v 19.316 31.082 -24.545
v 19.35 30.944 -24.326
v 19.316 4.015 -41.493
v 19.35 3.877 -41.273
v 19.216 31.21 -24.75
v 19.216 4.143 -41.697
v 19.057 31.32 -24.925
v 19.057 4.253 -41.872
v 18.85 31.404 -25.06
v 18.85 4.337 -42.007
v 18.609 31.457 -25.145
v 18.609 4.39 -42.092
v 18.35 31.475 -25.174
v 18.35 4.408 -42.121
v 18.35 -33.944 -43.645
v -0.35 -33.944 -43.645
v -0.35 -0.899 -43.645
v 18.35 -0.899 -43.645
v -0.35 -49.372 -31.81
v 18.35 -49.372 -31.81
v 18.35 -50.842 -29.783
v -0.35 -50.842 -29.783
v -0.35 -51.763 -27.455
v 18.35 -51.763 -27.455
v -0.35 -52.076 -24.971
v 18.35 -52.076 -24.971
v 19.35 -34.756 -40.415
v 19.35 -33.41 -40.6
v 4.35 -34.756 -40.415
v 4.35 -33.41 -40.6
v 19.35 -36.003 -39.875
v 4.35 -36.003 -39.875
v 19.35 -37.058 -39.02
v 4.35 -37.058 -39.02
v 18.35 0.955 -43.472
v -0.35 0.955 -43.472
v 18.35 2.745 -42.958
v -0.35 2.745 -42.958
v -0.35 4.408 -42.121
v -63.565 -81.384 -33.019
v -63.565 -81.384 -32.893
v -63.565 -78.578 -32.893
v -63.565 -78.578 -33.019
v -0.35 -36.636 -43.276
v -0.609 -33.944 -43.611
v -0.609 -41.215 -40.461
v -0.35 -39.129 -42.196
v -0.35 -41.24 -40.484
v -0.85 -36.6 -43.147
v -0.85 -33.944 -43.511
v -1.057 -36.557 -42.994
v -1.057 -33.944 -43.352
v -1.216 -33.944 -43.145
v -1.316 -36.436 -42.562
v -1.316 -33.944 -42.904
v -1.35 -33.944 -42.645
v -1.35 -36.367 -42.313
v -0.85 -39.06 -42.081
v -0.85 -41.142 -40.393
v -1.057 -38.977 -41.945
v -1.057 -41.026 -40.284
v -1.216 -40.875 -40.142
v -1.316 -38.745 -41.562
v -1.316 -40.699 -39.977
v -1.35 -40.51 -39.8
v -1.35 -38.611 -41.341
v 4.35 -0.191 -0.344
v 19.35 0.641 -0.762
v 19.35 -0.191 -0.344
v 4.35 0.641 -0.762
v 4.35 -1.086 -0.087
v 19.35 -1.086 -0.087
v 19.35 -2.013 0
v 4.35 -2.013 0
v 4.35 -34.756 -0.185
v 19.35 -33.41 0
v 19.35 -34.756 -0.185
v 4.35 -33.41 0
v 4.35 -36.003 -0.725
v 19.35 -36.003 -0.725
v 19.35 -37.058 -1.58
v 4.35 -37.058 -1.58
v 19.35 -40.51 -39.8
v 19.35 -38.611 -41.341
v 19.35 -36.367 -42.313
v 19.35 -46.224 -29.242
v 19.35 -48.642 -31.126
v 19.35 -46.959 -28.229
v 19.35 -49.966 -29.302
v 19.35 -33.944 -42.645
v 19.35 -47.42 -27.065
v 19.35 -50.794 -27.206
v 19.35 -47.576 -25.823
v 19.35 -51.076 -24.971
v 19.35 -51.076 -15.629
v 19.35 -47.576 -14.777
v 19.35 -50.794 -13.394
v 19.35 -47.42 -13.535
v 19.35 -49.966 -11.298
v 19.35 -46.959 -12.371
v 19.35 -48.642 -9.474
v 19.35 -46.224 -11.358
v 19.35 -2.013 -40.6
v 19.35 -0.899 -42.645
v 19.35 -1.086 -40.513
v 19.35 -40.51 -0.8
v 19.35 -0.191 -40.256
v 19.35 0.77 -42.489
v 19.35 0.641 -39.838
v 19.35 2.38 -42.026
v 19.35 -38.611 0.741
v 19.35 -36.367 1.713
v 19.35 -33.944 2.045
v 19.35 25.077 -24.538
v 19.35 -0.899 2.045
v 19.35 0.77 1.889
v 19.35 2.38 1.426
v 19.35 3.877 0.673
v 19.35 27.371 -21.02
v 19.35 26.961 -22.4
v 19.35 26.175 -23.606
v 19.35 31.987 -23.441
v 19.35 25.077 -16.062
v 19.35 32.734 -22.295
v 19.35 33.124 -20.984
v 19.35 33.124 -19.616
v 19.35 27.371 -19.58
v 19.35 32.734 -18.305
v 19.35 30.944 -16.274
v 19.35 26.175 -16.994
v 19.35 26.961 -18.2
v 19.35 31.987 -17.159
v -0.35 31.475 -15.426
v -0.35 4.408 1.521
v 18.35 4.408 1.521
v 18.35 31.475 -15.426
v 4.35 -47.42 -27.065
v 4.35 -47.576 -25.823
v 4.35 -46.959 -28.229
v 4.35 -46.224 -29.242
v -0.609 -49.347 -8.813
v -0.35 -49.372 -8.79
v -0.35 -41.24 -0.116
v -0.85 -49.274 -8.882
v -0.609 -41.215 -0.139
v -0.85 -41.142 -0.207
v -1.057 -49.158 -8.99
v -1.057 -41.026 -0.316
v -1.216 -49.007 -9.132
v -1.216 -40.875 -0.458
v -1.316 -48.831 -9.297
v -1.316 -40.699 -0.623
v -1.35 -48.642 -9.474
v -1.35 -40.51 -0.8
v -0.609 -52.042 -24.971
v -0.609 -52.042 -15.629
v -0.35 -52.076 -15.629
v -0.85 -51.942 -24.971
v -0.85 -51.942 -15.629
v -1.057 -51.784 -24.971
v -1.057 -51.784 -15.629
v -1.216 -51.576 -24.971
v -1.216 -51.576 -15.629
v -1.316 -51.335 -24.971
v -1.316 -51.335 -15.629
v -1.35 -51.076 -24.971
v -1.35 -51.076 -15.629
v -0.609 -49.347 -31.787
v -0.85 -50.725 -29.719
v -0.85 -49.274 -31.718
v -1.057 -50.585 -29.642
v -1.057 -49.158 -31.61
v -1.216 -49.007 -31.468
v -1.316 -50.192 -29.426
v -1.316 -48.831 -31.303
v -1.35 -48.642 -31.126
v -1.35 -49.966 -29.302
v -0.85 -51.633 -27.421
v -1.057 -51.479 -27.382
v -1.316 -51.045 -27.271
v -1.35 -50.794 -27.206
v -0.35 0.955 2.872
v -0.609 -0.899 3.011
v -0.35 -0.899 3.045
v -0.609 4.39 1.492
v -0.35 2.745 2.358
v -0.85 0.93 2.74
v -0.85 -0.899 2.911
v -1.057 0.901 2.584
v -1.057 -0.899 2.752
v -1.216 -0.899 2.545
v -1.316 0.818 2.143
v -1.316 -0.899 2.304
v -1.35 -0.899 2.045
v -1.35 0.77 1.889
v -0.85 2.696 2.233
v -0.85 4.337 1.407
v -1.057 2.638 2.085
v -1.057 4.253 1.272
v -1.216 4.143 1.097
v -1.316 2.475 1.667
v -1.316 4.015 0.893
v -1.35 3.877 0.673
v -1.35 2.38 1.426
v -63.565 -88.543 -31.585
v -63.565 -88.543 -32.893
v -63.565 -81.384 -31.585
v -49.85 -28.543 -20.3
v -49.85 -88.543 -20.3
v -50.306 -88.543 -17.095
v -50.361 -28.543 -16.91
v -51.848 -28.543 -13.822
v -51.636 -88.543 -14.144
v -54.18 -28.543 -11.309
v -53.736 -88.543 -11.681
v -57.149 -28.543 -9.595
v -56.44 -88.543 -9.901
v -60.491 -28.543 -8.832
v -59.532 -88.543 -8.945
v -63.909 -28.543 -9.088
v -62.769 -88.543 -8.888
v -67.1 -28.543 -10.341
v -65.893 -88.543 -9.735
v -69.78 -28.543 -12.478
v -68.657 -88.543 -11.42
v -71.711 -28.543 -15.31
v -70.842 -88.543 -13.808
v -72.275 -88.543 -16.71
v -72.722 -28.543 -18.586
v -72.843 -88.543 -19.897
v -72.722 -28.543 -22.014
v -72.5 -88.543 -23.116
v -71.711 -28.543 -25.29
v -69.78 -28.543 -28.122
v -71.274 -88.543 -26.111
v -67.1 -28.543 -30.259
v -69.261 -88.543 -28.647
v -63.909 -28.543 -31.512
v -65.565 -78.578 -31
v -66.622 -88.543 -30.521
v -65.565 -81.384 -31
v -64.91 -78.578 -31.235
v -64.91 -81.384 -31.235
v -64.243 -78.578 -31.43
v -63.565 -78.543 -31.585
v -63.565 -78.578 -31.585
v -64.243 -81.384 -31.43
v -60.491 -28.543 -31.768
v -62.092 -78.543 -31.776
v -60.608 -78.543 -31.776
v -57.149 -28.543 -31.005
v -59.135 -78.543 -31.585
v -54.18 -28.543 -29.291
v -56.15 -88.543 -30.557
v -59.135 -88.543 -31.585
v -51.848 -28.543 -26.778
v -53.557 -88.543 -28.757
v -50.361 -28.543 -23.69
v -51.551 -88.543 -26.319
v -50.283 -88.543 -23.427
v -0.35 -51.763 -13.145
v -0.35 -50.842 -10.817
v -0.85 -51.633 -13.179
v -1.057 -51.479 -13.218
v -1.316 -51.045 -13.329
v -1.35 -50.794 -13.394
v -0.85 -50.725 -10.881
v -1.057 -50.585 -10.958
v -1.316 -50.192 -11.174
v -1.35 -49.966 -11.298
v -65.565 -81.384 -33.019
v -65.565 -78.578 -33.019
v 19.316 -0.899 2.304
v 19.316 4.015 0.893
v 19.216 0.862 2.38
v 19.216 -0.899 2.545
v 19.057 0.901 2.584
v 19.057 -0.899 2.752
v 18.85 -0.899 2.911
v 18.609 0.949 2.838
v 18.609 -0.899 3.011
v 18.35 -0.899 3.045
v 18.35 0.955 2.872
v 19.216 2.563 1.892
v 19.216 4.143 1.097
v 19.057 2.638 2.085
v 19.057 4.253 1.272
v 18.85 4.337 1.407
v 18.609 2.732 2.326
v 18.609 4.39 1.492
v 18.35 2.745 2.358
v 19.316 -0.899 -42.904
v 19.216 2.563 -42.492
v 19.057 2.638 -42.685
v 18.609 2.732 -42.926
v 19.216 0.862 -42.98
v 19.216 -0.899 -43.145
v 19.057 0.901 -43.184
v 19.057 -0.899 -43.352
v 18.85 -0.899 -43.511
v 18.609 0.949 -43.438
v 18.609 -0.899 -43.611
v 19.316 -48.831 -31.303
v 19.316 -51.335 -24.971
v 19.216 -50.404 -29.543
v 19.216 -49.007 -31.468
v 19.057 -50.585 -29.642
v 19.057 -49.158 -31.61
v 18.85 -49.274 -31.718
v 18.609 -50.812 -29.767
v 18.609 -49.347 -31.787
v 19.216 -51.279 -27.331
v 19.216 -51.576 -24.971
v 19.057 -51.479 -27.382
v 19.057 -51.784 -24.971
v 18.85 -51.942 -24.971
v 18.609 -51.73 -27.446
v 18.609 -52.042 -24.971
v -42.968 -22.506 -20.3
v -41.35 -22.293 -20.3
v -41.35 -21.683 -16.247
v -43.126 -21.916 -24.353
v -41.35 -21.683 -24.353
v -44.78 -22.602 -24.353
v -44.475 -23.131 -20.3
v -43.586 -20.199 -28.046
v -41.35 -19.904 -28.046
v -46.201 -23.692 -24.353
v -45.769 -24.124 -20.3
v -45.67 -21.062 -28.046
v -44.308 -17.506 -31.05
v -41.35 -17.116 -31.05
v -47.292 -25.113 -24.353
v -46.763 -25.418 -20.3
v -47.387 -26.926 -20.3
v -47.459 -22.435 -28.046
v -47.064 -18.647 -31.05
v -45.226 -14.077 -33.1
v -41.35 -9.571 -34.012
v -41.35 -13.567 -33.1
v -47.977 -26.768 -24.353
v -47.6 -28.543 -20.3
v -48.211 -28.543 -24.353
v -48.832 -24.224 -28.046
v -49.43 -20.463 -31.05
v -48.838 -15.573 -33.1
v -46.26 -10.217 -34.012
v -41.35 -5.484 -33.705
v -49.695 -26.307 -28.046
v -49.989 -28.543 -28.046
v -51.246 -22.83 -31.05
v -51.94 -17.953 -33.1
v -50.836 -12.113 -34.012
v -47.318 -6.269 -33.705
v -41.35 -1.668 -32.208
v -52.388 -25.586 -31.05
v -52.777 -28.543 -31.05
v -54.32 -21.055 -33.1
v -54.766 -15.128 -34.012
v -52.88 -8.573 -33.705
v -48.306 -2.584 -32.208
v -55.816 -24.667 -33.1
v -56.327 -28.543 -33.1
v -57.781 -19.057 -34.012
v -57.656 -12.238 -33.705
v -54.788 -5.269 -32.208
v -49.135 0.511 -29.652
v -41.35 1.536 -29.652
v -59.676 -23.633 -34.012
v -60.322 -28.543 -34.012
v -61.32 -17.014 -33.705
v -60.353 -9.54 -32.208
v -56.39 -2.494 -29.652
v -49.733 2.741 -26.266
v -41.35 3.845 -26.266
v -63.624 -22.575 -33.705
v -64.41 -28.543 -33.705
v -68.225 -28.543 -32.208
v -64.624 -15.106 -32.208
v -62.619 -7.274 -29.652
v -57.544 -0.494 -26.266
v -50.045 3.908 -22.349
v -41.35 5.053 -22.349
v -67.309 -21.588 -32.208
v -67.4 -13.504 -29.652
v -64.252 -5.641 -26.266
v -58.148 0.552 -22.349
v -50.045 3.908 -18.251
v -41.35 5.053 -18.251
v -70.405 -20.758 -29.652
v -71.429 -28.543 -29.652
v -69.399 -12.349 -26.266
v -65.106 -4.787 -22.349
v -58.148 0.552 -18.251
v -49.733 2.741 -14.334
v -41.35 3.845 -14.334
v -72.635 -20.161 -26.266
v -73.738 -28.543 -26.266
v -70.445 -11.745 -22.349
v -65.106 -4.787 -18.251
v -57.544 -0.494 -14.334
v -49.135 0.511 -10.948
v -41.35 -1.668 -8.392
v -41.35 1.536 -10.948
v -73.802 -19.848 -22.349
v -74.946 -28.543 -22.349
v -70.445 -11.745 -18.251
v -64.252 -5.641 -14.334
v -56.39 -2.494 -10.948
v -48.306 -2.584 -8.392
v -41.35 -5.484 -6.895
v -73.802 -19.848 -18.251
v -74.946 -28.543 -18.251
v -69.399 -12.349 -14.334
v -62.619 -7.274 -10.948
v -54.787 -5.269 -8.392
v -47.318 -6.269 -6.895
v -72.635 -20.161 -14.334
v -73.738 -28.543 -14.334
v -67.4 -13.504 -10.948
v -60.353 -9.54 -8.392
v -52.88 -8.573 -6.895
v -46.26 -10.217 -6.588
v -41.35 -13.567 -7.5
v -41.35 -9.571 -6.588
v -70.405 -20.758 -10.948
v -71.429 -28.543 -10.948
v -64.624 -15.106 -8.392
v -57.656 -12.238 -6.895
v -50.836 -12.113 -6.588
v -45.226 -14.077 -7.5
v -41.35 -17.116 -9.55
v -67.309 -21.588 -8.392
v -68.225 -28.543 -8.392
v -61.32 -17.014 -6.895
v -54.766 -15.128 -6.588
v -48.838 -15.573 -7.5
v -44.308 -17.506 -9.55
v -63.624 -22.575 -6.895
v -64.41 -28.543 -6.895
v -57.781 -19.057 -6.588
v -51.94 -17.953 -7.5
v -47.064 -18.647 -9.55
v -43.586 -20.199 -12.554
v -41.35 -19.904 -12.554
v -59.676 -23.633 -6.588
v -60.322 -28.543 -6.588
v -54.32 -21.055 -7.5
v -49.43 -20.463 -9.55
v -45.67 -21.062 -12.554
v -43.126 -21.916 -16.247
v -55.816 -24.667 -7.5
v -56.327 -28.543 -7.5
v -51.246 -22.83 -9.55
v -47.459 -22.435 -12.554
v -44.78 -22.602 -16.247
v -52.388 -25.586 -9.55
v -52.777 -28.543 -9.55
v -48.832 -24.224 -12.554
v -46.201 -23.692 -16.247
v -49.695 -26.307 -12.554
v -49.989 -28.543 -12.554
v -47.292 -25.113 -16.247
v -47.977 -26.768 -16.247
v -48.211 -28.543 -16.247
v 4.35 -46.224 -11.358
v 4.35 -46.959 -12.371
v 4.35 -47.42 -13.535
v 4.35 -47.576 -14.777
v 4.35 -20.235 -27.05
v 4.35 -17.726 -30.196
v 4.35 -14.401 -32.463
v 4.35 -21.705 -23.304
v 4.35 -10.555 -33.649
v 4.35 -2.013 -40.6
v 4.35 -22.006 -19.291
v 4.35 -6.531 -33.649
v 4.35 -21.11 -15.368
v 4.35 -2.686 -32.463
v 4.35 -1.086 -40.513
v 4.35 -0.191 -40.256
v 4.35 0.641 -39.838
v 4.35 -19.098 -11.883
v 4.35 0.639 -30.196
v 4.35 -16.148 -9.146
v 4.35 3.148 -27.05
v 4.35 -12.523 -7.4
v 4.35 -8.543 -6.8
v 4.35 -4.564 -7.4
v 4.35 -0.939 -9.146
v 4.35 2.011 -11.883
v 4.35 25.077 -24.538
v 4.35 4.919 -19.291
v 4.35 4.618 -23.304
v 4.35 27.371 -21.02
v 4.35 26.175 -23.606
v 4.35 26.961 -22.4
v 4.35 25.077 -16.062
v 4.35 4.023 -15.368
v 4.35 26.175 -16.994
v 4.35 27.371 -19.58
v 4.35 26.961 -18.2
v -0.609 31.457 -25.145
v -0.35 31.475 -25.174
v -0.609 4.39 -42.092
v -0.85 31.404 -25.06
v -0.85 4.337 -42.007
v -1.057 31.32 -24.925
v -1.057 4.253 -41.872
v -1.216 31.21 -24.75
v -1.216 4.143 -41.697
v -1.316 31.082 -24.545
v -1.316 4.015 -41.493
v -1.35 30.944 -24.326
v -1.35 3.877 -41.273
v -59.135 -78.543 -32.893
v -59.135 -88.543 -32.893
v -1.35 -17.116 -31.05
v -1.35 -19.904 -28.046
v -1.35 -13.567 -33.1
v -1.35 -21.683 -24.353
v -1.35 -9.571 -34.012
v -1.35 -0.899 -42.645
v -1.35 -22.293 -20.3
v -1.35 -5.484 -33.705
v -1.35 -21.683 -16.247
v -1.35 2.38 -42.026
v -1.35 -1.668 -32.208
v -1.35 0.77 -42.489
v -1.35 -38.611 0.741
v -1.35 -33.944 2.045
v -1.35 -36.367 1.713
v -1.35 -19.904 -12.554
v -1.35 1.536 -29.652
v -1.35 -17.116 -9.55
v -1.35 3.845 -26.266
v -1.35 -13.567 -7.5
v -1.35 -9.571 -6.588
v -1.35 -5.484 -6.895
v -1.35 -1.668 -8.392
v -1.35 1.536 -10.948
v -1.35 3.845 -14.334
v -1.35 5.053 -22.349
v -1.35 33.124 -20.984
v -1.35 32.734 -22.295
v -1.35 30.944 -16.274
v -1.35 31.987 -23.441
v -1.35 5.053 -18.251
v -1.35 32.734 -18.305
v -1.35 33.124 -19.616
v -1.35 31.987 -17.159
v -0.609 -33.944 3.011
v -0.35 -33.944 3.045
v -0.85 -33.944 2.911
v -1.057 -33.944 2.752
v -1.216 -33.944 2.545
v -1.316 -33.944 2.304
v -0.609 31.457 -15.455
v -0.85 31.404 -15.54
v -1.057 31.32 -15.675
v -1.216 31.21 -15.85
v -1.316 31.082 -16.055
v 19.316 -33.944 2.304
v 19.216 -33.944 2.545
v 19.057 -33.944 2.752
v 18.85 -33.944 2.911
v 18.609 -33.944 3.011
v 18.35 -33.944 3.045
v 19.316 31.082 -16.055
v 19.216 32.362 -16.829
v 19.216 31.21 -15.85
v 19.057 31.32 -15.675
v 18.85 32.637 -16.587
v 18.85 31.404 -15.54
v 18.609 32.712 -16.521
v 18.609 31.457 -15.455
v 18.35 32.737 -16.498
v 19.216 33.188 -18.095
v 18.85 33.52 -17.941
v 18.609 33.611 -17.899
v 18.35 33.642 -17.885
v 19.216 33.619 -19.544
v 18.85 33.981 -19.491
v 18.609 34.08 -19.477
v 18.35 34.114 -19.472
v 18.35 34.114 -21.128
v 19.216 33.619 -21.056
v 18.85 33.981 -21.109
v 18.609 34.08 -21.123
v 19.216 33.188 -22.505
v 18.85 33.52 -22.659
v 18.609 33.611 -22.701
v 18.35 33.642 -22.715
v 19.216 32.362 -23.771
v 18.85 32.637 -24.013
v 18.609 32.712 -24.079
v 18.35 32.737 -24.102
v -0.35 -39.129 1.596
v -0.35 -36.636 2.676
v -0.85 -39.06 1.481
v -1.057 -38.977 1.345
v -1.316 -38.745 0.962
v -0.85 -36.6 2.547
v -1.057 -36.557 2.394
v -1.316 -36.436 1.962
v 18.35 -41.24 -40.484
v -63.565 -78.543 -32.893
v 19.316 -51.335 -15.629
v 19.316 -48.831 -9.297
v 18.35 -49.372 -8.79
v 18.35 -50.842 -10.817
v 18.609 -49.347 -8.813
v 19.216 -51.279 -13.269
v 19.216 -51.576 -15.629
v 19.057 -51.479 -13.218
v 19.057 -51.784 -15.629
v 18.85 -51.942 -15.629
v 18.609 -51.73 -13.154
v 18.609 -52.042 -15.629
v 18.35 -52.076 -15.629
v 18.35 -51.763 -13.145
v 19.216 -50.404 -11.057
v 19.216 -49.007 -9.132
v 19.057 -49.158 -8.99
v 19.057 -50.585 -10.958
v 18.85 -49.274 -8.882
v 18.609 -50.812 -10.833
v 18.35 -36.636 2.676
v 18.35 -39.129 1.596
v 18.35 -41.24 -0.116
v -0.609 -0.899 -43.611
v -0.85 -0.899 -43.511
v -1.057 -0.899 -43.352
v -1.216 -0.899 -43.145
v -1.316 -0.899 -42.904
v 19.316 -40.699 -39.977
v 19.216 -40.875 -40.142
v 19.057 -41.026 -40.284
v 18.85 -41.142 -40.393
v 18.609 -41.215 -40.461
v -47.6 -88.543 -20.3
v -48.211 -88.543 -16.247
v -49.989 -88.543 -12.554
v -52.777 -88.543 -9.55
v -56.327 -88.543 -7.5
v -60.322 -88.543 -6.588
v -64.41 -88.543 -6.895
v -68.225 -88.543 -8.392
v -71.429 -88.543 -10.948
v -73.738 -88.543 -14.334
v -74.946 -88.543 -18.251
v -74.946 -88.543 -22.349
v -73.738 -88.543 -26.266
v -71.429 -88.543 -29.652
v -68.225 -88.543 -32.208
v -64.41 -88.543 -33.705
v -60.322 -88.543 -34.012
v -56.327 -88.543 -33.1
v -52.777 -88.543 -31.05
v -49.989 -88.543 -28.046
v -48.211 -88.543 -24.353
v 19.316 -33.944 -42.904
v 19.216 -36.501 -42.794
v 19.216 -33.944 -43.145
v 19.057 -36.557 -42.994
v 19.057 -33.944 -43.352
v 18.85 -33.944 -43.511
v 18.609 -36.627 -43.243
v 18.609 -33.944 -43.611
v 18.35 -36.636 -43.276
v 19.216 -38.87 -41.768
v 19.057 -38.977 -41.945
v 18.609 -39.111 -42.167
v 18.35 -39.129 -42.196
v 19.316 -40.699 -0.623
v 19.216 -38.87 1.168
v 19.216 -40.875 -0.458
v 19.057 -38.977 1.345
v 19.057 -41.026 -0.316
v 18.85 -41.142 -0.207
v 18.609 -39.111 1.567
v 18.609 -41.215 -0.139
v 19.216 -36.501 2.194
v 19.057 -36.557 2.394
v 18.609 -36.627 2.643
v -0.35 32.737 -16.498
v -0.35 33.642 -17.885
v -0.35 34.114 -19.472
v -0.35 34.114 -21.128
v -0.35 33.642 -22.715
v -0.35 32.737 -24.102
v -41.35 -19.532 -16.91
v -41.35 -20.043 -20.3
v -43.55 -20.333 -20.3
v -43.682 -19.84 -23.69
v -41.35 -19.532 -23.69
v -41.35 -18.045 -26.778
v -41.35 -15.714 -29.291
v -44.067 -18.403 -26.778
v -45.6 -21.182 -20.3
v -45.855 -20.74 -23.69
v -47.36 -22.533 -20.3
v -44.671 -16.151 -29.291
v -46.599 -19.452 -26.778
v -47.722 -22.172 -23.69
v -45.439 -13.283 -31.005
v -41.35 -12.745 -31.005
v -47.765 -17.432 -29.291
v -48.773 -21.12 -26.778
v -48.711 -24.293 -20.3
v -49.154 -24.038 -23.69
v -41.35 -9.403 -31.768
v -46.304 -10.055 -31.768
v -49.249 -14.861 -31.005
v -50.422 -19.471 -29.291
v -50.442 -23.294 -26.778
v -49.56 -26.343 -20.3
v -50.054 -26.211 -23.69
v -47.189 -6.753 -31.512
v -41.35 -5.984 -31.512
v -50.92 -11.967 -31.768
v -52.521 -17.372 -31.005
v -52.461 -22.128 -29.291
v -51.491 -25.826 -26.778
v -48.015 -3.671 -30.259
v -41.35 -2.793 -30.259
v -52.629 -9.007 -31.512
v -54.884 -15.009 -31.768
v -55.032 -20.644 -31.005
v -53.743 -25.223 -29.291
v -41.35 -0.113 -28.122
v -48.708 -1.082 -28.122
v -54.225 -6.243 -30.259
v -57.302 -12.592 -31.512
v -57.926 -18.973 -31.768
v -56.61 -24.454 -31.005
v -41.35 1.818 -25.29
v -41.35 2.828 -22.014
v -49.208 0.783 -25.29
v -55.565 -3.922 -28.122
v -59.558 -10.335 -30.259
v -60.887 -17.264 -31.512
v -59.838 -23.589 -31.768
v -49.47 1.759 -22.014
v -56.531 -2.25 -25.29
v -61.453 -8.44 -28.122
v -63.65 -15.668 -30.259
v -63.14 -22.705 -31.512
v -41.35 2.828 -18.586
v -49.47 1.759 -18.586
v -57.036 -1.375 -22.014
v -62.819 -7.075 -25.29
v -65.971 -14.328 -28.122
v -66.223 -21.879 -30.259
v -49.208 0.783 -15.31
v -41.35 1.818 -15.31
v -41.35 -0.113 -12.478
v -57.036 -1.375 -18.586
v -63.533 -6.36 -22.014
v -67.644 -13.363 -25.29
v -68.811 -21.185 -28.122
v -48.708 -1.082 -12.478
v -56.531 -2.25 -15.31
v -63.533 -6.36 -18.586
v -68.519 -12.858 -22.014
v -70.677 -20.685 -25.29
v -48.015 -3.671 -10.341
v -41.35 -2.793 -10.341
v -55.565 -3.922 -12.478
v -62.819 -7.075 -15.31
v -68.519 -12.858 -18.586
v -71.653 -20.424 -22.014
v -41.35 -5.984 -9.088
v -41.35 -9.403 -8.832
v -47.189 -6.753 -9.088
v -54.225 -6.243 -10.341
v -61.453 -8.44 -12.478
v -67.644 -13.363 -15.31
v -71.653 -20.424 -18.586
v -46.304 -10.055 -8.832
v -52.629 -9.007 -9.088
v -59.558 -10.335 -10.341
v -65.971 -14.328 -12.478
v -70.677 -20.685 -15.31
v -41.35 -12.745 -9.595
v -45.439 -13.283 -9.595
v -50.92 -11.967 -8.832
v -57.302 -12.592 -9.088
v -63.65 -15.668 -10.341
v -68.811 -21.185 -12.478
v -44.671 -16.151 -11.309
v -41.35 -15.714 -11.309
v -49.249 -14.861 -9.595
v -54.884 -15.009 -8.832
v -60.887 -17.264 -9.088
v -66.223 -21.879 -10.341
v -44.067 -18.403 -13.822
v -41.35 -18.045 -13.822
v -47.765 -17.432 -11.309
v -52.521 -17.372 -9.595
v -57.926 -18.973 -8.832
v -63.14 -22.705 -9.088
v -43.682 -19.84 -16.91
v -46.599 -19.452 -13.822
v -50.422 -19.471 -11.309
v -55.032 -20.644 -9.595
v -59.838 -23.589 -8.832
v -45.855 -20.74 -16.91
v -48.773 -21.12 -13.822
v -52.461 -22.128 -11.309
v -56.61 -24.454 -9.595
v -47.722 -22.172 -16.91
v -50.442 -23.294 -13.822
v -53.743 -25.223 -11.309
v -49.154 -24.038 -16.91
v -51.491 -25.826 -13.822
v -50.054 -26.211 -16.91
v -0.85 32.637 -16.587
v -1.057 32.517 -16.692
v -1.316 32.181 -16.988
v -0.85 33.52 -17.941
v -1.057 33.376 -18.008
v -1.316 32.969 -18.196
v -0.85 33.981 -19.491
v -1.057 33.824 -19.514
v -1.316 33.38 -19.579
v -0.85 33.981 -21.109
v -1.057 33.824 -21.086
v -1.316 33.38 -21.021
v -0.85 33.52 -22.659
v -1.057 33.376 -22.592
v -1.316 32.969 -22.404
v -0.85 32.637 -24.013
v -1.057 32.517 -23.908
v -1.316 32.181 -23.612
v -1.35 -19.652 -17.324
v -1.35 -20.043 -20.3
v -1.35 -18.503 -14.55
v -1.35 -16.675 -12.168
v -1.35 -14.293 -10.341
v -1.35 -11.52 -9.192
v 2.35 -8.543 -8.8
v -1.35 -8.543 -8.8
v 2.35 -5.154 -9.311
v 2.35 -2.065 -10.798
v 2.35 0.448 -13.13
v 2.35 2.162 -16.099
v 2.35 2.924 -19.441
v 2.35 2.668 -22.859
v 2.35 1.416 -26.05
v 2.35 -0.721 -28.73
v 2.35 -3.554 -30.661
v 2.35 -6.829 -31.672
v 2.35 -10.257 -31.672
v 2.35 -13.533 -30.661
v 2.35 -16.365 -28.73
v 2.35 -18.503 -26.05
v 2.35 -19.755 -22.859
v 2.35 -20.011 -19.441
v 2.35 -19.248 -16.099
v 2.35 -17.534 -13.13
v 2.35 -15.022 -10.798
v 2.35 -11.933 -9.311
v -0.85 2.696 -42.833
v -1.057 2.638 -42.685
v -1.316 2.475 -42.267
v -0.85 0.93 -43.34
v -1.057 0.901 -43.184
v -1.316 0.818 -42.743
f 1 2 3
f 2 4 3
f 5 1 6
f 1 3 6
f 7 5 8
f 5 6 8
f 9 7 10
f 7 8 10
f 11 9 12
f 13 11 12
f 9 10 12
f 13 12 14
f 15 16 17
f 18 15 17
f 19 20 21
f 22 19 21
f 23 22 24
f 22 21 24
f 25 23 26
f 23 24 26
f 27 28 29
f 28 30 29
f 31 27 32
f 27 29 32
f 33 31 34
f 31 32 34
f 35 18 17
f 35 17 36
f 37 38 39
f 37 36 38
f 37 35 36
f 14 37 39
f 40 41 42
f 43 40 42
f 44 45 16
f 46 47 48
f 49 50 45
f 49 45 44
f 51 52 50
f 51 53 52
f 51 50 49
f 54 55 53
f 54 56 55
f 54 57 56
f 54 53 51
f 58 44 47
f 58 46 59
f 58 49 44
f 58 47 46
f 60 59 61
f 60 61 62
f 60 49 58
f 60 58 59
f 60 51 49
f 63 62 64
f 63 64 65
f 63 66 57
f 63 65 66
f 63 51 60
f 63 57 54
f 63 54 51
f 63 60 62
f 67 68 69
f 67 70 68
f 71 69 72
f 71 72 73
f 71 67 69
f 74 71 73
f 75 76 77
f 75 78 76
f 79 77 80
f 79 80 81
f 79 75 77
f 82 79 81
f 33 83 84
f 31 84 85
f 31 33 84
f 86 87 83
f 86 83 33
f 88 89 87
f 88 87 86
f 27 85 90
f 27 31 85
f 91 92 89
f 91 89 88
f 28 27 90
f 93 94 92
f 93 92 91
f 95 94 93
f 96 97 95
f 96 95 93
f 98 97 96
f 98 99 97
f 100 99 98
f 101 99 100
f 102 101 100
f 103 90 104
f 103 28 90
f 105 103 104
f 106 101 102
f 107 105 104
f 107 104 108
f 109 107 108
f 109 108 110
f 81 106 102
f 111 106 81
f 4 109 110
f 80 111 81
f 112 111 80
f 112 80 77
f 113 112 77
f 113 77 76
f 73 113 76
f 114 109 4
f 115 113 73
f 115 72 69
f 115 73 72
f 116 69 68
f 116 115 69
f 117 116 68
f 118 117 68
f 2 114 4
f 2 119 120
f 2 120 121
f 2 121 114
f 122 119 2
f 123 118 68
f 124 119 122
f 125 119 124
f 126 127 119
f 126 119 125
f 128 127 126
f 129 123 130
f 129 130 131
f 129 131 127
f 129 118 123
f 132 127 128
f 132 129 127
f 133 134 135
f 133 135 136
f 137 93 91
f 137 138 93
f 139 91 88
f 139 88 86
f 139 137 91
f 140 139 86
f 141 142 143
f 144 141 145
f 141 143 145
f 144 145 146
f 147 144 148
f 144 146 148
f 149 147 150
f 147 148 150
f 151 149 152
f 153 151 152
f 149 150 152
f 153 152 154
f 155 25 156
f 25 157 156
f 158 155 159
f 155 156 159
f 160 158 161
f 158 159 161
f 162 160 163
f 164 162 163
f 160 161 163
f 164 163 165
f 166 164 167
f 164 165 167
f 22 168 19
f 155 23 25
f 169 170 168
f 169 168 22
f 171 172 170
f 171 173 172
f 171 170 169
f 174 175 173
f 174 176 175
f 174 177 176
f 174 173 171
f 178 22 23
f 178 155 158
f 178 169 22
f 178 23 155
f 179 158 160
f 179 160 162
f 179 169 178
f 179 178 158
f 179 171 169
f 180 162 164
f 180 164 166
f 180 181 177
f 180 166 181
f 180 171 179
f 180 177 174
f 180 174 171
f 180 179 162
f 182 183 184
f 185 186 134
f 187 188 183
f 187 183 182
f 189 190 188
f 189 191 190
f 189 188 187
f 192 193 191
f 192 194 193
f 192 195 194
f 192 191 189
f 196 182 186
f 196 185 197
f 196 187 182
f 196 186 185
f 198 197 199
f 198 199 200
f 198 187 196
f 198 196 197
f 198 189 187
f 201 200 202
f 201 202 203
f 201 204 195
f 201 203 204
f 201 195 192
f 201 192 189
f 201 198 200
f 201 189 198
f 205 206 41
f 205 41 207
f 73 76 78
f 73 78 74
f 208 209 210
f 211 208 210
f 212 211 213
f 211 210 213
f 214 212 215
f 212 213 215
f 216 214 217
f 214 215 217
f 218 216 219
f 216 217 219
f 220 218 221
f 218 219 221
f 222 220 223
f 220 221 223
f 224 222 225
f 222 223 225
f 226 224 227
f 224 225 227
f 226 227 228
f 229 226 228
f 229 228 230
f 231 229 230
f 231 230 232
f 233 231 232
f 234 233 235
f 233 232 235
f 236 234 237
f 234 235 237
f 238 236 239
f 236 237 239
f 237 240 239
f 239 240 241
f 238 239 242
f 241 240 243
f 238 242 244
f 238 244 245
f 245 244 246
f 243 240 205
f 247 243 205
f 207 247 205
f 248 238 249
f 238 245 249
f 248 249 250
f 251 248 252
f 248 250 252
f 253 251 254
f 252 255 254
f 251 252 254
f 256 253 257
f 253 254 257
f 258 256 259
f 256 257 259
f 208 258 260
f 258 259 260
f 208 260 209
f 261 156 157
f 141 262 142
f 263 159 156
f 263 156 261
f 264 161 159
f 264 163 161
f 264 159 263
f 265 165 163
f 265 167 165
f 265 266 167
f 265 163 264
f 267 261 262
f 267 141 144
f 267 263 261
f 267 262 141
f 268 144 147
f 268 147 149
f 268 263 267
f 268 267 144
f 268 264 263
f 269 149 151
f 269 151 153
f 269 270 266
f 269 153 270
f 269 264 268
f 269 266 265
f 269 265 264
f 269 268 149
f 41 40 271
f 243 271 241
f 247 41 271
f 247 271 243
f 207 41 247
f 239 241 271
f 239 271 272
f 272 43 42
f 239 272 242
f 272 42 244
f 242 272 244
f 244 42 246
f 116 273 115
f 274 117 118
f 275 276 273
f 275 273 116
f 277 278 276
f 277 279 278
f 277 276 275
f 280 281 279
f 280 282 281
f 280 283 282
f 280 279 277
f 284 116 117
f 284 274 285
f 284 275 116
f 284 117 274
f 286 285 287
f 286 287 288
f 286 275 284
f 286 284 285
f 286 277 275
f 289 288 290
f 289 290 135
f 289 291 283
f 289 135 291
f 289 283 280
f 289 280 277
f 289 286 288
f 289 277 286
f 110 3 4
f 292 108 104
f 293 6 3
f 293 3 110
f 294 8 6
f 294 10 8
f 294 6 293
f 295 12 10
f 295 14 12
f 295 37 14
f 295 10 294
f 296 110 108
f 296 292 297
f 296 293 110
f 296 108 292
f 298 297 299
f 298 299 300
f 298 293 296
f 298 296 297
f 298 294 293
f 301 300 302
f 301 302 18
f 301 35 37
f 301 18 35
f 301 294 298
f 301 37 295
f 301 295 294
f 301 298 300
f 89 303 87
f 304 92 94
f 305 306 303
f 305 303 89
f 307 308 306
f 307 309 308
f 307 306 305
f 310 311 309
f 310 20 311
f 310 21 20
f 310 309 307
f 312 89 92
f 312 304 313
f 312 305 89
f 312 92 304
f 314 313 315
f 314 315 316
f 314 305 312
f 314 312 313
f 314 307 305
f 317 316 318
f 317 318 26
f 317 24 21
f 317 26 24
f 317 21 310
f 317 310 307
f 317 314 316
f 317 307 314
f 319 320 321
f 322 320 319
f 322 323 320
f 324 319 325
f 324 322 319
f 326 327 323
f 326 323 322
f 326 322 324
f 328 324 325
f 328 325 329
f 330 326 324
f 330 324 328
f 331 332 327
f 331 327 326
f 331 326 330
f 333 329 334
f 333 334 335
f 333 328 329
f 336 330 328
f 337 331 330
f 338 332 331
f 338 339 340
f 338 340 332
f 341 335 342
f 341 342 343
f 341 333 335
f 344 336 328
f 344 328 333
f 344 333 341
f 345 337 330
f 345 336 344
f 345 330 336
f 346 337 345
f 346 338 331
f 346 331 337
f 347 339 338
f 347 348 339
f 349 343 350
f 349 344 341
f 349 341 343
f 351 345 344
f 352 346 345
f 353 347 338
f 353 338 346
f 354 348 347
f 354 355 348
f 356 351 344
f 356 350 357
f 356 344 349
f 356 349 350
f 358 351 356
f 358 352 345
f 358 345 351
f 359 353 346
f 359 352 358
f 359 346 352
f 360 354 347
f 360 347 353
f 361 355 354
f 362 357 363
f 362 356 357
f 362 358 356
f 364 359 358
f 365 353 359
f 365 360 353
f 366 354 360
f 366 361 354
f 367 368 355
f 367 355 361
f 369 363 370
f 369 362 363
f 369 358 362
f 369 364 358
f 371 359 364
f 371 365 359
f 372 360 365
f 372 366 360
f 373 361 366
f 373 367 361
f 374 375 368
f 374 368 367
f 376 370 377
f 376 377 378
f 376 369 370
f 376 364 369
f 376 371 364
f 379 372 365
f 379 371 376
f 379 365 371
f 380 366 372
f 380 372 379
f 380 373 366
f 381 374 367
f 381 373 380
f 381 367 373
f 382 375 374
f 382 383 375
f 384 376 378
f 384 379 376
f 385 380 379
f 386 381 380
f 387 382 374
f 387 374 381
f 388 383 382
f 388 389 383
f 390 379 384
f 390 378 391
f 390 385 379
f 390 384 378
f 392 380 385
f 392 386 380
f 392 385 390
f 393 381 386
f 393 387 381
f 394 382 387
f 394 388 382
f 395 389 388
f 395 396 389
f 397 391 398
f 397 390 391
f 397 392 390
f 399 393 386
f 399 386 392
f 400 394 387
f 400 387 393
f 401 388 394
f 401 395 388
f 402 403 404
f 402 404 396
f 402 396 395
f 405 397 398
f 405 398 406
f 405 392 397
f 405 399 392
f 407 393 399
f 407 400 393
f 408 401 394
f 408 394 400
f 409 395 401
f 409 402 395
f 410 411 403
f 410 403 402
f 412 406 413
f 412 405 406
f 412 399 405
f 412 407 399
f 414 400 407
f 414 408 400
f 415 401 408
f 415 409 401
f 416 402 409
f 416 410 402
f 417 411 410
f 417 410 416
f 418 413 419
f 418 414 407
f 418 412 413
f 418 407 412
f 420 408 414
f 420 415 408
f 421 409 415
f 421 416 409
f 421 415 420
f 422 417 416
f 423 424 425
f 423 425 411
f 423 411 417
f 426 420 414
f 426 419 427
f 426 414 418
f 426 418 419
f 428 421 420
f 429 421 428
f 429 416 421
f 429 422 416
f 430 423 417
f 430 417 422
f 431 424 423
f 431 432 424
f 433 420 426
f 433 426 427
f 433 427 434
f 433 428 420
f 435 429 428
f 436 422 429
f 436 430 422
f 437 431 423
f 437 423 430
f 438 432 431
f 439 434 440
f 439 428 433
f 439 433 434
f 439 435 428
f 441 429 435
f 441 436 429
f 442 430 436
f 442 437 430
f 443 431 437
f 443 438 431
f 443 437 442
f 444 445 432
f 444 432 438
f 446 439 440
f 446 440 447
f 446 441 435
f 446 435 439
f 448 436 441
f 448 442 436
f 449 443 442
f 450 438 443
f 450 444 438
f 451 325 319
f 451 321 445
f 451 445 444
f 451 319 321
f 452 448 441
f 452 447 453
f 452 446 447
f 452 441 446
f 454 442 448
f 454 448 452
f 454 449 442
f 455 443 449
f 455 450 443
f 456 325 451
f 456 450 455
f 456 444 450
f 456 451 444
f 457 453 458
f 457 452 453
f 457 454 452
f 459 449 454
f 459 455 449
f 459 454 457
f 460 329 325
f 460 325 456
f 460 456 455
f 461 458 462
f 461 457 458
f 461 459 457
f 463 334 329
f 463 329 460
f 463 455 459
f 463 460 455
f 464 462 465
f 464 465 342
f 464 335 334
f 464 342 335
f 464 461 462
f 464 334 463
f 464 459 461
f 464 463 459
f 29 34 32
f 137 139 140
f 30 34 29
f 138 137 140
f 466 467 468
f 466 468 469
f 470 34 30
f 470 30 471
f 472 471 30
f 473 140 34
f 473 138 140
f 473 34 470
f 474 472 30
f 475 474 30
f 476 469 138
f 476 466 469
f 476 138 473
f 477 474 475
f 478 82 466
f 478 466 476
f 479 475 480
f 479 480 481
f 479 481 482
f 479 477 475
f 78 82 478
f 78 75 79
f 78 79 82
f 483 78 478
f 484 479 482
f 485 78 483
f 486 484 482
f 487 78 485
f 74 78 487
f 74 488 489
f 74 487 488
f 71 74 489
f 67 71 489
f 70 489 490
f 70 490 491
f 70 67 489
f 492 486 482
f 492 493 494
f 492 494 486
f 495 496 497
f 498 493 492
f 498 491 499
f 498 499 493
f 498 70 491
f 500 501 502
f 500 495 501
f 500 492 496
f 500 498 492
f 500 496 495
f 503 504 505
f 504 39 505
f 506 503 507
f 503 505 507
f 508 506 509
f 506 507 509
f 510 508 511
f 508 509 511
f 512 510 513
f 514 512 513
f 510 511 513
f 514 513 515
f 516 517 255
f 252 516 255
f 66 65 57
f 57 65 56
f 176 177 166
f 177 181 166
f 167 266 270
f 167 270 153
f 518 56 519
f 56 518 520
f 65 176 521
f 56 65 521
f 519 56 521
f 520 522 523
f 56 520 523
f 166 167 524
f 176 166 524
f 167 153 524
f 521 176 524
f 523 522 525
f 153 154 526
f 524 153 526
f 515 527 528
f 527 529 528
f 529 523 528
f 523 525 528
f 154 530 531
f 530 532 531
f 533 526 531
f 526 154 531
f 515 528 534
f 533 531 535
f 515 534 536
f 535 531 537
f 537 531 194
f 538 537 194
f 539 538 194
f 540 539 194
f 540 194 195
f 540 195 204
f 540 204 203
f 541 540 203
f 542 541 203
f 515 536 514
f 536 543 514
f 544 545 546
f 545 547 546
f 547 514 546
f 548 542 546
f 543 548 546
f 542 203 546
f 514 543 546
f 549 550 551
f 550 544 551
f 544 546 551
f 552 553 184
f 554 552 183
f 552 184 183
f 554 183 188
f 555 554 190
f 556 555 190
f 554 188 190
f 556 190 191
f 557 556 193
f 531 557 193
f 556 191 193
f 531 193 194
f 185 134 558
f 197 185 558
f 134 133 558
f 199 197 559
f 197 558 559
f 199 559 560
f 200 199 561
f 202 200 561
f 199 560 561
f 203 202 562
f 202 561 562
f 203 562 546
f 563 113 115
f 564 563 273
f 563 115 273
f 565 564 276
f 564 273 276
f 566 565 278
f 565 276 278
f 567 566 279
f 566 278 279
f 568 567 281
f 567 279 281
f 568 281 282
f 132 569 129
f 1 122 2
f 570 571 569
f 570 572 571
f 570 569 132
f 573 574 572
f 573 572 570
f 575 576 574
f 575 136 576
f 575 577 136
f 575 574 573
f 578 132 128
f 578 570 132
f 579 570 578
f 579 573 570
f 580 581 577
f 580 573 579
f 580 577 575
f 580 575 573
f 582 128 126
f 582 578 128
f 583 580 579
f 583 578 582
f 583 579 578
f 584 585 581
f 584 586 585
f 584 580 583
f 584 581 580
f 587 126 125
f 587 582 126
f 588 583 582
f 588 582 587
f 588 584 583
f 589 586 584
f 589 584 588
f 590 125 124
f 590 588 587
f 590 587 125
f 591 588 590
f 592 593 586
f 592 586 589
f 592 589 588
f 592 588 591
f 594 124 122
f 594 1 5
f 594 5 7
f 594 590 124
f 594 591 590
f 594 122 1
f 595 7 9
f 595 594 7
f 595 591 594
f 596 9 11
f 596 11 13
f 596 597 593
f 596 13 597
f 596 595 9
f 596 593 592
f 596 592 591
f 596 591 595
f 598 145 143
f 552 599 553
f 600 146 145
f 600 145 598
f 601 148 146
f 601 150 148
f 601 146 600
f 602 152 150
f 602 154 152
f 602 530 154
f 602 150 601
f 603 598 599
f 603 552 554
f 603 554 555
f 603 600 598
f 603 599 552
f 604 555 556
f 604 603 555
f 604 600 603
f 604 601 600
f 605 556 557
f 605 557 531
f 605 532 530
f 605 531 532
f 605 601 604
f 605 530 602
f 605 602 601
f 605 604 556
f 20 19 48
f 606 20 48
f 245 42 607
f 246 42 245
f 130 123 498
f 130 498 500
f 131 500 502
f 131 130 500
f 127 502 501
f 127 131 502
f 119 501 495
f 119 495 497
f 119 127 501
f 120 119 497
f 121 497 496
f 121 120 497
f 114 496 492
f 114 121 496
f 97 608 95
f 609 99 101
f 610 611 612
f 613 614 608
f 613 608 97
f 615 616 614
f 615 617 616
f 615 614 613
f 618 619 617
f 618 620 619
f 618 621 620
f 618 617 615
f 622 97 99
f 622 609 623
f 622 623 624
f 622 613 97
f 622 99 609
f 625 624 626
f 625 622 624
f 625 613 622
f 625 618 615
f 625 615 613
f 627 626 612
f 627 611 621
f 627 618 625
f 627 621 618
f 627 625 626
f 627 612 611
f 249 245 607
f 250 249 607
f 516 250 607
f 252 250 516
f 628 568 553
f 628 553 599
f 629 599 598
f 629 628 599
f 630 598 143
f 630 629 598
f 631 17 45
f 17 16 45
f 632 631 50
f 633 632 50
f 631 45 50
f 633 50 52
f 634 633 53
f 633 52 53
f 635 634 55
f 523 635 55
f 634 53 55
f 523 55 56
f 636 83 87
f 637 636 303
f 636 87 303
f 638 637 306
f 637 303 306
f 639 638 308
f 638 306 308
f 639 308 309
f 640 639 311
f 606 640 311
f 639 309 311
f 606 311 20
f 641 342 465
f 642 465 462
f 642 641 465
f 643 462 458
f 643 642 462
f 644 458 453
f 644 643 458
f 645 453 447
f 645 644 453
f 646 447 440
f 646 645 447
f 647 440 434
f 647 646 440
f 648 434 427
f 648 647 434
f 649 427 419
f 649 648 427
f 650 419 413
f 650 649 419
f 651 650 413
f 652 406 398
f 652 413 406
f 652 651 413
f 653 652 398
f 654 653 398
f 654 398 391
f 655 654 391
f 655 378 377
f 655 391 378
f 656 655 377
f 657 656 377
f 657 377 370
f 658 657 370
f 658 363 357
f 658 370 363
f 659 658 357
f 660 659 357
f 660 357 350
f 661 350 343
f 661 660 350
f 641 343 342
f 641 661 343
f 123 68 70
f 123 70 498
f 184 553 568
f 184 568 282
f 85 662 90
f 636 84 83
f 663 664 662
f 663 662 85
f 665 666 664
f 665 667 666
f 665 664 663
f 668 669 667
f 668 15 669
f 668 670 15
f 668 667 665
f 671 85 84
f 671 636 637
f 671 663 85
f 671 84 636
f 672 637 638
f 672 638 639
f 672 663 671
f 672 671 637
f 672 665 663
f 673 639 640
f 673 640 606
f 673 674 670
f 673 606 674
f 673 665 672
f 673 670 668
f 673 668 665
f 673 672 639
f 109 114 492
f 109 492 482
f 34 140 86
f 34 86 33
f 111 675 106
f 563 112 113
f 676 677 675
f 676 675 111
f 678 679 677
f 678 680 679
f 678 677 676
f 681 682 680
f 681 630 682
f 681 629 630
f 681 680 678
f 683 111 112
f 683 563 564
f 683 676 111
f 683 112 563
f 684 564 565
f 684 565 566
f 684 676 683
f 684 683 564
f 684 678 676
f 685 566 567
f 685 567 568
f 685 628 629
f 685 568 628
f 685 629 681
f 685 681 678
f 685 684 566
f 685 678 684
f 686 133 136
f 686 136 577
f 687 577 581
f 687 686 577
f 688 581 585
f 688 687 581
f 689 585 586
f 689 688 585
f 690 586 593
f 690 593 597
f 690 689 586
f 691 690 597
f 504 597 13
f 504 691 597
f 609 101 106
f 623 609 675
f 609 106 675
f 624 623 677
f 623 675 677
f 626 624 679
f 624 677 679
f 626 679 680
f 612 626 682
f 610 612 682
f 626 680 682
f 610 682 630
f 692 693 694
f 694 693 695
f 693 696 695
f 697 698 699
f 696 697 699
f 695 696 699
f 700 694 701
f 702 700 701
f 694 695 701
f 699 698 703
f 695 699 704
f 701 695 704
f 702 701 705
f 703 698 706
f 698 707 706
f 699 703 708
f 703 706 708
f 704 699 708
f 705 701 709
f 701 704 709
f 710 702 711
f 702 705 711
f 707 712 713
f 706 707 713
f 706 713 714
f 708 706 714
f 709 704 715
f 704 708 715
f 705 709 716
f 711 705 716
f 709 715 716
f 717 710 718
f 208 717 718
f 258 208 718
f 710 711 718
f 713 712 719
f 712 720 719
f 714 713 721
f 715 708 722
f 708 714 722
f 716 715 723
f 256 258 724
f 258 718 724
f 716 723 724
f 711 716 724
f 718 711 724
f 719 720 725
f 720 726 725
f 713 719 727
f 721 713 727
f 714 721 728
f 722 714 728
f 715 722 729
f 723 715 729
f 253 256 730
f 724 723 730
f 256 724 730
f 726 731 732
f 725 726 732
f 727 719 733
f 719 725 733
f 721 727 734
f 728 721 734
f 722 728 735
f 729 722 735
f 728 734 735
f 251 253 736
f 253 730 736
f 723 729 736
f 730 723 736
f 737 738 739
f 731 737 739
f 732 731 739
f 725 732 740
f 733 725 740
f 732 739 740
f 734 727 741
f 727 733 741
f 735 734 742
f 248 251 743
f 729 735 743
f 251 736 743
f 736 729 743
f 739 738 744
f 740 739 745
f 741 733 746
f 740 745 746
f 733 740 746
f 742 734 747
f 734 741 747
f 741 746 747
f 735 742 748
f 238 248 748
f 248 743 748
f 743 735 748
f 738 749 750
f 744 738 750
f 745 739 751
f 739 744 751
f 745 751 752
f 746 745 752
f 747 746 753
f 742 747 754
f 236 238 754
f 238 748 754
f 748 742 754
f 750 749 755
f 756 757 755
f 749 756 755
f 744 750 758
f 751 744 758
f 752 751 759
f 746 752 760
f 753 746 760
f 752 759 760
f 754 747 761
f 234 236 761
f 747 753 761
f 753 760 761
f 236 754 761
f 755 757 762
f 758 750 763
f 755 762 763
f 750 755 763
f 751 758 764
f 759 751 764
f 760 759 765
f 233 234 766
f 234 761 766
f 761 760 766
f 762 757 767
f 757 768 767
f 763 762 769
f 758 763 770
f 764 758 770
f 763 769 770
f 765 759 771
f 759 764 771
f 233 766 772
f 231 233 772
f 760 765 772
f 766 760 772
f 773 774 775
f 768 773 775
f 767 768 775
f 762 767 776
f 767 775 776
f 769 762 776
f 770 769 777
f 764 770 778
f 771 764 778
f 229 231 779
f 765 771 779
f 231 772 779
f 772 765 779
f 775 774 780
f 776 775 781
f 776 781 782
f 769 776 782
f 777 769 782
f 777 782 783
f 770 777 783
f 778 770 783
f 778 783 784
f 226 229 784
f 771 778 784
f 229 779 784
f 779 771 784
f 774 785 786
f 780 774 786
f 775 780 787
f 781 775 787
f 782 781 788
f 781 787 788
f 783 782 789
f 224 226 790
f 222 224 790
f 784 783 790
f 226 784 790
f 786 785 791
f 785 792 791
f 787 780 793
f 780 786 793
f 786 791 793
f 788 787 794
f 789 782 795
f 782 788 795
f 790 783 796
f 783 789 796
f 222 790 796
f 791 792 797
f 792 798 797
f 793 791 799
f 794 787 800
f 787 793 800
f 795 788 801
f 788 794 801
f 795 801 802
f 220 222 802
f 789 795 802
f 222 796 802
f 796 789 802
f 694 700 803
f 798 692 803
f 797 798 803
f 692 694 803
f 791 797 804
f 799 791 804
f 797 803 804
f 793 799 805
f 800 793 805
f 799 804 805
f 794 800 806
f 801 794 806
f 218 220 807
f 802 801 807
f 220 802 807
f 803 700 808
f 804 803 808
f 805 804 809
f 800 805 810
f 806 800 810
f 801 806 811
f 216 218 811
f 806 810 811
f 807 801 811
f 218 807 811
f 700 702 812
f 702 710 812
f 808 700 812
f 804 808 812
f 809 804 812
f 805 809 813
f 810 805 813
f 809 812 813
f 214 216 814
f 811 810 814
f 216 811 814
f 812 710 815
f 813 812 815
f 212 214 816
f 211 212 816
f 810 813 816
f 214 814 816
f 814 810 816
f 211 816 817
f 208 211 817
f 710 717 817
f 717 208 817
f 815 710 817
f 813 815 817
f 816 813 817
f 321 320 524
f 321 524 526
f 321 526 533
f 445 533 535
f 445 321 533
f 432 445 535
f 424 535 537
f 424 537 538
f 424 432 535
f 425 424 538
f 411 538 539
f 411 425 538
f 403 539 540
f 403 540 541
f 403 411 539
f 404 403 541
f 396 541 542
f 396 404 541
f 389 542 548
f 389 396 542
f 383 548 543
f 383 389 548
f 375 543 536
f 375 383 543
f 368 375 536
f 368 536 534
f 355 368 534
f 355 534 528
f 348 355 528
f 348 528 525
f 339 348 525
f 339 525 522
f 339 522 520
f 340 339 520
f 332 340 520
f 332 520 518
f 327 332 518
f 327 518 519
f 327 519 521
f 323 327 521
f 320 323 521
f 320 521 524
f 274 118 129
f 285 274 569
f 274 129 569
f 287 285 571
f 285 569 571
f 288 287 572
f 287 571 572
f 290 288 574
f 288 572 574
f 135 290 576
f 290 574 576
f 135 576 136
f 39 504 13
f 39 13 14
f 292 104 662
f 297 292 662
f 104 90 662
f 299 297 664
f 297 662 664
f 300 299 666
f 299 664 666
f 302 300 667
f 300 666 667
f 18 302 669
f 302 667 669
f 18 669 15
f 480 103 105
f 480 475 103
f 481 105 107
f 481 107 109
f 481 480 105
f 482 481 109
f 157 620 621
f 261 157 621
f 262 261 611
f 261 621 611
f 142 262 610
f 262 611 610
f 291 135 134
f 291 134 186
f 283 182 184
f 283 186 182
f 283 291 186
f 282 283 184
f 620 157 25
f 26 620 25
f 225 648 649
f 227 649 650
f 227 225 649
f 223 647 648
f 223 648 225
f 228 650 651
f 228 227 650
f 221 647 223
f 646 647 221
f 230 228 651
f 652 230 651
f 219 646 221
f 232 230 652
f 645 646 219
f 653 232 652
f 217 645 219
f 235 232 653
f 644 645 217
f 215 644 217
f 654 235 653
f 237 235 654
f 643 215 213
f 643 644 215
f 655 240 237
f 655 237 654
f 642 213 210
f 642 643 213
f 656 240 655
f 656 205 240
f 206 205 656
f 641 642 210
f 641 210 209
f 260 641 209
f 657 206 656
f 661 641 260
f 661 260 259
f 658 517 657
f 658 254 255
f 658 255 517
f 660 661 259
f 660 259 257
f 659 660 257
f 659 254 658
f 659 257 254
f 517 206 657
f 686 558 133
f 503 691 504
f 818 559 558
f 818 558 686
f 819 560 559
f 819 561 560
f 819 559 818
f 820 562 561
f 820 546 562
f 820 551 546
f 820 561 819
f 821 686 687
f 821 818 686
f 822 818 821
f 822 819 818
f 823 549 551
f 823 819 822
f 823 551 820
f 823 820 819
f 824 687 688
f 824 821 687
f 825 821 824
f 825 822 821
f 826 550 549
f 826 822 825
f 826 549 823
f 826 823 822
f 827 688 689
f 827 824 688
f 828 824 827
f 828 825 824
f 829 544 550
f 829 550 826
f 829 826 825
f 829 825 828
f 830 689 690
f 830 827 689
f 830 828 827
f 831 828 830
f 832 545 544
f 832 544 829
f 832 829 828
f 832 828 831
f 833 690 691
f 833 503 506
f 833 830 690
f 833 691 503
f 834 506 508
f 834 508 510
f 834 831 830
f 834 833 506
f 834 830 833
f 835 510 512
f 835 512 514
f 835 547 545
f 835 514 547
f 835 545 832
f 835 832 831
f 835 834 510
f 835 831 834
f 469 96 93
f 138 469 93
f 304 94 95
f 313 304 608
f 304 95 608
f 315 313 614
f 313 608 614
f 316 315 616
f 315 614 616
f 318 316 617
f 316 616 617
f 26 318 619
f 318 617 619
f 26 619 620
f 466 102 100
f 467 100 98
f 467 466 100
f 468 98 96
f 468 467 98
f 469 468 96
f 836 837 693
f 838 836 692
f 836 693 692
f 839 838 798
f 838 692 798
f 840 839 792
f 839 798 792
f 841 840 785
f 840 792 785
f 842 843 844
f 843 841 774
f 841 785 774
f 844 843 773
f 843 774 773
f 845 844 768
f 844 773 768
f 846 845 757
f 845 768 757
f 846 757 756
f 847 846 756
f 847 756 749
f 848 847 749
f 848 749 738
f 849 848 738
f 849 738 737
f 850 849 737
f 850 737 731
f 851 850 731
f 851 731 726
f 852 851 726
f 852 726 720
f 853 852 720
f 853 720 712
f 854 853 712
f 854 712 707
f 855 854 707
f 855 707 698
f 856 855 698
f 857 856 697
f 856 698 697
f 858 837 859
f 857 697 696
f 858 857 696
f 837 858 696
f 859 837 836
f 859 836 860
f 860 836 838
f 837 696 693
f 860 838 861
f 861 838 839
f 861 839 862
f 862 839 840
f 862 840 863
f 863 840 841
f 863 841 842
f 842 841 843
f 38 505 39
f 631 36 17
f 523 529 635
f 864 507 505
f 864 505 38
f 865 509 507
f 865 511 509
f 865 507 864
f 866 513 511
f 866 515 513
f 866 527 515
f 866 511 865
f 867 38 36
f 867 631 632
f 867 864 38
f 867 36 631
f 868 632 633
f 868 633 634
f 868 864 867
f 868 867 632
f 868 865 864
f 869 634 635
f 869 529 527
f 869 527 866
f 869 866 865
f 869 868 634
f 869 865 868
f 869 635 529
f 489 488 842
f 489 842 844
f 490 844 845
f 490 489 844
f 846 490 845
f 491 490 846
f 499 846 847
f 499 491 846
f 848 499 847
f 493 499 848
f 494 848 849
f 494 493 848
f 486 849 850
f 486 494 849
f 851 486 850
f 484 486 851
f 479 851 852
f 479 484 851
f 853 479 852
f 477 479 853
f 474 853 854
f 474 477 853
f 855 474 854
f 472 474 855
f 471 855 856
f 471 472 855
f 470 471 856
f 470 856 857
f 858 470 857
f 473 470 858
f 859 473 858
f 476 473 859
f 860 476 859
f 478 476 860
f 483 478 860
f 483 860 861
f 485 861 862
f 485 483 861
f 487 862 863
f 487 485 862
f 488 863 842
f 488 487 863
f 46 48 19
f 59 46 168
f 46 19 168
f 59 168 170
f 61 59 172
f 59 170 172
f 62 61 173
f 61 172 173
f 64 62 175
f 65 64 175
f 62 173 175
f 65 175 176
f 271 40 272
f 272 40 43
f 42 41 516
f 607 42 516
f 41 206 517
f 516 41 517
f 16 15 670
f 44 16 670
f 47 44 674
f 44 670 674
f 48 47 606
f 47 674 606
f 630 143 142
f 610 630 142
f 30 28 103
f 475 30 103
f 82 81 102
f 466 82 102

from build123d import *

# Parameters (mm, degrees)
BOSS_EXTRUDE1_DEPTH  = 18
SCALE1_SCALE         = 1.15
CUT_EXTRUDE1_DEPTH   = 15
FILLET1_R            = 10
FILLET2_R            = 5
FILLET3_R            = 1
FILLET4_R            = 1
SKETCH9_R            = 11.5
CUT_EXTRUDE2_DEPTH   = 72.03051567
CHAMFER1_SIZE        = 2
SWEEP1_PROFILE_R     = 13.75
CUT_SWEEP2_PROFILE_R = 11.5
SKETCH13_W           = 4.429427916
SKETCH13_H           = 5.487691531
CUT_EXTRUDE3_DEPTH   = 10
SKETCH34_W           = 2.806069431
SKETCH34_H           = 2.063682343
CUT_EXTRUDE6_DEPTH   = 2


with BuildPart() as part:
    # Sketch1 → Boss-Extrude1 (new body)
    with BuildSketch(Plane.YZ):
        with BuildLine():
            Line((-35, -40.6), (0, -40.6))
            Line((0, -40.6), (25.653410767, -24.537854564))
            ThreePointArc((25.653410767, -24.537854564), (28, -20.3), (25.653410767, -16.062145436))
            Line((25.653410767, -16.062145436), (0, 0))
            Line((0, 0), (-35, 0))
            Line((-35, 0), (-47, -12.8))
            Line((-47, -12.8), (-47, -27.8))
            Line((-47, -27.8), (-35, -40.6))
        make_face()
    extrude(amount=BOSS_EXTRUDE1_DEPTH)


with BuildPart() as part_1:
    # Scale1: scaled about (9, -13.156905102, -20.3)
    add(part.part.scale(SCALE1_SCALE).moved(Location((-1.35, 1.973535765, 3.045))))

    # Sketch7 → Cut-Extrude1 (cut)
    with BuildSketch(Plane.YZ.offset(19.35)):
        with BuildLine():
            Line((-35.576464235, -40.6), (-0.576464235, -40.6))
            Line((-0.576464235, -40.6), (25.076946532, -24.537854564))
            ThreePointArc((25.076946532, -24.537854564), (27.423535765, -20.3), (25.076946532, -16.062145436))
            Line((25.076946532, -16.062145436), (-0.576464235, 0))
            Line((-0.576464235, 0), (-35.576464235, 0))
            Line((-35.576464235, 0), (-47.576464235, -12.8))
            Line((-47.576464235, -12.8), (-47.576464235, -27.8))
            Line((-47.576464235, -27.8), (-35.576464235, -40.6))
        make_face()
    extrude(amount=-CUT_EXTRUDE1_DEPTH, mode=Mode.SUBTRACT)

    # Fillet1
    fillet1_edges = [part_1.edges().sort_by_distance(p)[0] for p in [
        (9, 1.973535765, 3.045),
        (9, -38.276464235, 3.045),
        (9, -52.076464235, -11.675),
        (9, -52.076464235, -28.925),
        (9, 1.973535765, -43.645),
        (9, -38.276464235, -43.645),
    ]]
    fillet(fillet1_edges, radius=FILLET1_R)

    # Fillet2
    fillet2_edges = [part_1.edges().sort_by_distance(p)[0] for p in [
        (11.85, -0.576464235, -40.6),
        (11.85, -35.576464235, -40.6),
        (11.85, -47.576464235, -27.8),
        (11.85, -47.576464235, -12.8),
        (11.85, -0.576464235, 0),
        (11.85, -35.576464235, 0),
    ]]
    fillet(fillet2_edges, radius=FILLET2_R)

    # Fillet3
    fillet3_edges = [part_1.edges().sort_by_distance(p)[0] for p in [
        (19.35, -45.305676214, -36.147173889),
        (19.35, -51.375757767, -28.647907393),
        (19.35, -52.076464235, -20.3),
        (19.35, -51.375757767, -11.952092607),
        (19.35, -45.305676214, -4.452826111),
        (19.35, -37.919435742, 2.220895403),
        (19.35, -17.421465972, 3.045),
        (19.35, 1.861910332, 2.656375845),
        (19.35, 17.941495924, -6.952879062),
        (19.35, 34.173535765, -20.3),
        (19.35, 17.941495924, -33.647120938),
        (19.35, 1.861910332, -43.256375845),
        (19.35, -17.421465972, -43.645),
        (19.35, -37.919435742, -42.820895403),
    ]]
    fillet(fillet3_edges, radius=FILLET3_R)

    # Fillet4
    fillet4_edges = [part_1.edges().sort_by_distance(p)[0] for p in [
        (-1.35, 1.861910332, -43.256375845),
        (-1.35, 17.941495924, -33.647120938),
        (-1.35, 34.173535765, -20.3),
        (-1.35, 17.941495924, -6.952879062),
        (-1.35, 1.861910332, 2.656375845),
        (-1.35, -17.421465972, 3.045),
        (-1.35, -37.919435742, 2.220895403),
        (-1.35, -45.305676214, -4.452826111),
        (-1.35, -51.375757767, -11.952092607),
        (-1.35, -52.076464235, -20.3),
        (-1.35, -51.375757767, -28.647907393),
        (-1.35, -45.305676214, -36.147173889),
        (-1.35, -37.919435742, -42.820895403),
        (-1.35, -17.421465972, -43.645),
    ]]
    fillet(fillet4_edges, radius=FILLET4_R)

    # Sketch9 → Cut-Extrude2 (cut, through all)
    with BuildSketch(Plane(origin=(-1.35, 0, 0), x_dir=(0, -1, 0), z_dir=(-1, 0, 0))):
        with Locations((8.54339023, -20.3)):
            Circle(SKETCH9_R)
    extrude(amount=-CUT_EXTRUDE2_DEPTH, mode=Mode.SUBTRACT)

    # Chamfer1
    chamfer1_edges = [part_1.edges().sort_by_distance(p)[0] for p in [
        (4.35, 2.95660977, -20.3),
    ]]
    chamfer(chamfer1_edges, length=CHAMFER1_SIZE)

    # Sweep1: sweep along a path in Sketch11
    with BuildLine(Plane.XY.offset(-20.3)) as sweep1_path:
        Line((-1.35, -8.54339023), (-41.35, -8.54339023))
        ThreePointArc((-41.35, -8.54339023), (-55.492135624, -14.401254607), (-61.35, -28.54339023))
        Line((-61.35, -28.54339023), (-61.35, -88.54339023))
    # Sweep1 profile (on start of the path) → Sweep1 (sweep)
    with BuildSketch(Plane(origin=(-1.35, -8.54339023, -20.3), x_dir=(0, -1, 0), z_dir=(-1, 0, 0))):
        Circle(SWEEP1_PROFILE_R)
    sweep(path=sweep1_path.line)

    # Cut-Sweep2: sweep along a path in Sketch11<3>
    with BuildLine(Plane.XY.offset(-20.3)) as cut_sweep2_path:
        Line((-1.35, -8.54339023), (-41.35, -8.54339023))
        ThreePointArc((-41.35, -8.54339023), (-55.492135624, -14.401254607), (-61.35, -28.54339023))
        Line((-61.35, -28.54339023), (-61.35, -88.54339023))
    # Cut-Sweep2 profile (on start of the path) → Cut-Sweep2 (sweep, cut)
    with BuildSketch(Plane(origin=(-1.35, -8.54339023, -20.3), x_dir=(0, -1, 0), z_dir=(-1, 0, 0))):
        Circle(CUT_SWEEP2_PROFILE_R)
    sweep(path=cut_sweep2_path.line, mode=Mode.SUBTRACT)

    # Sketch13 → Cut-Extrude3 (cut)
    with BuildSketch(Plane.XZ.offset(88.54339023)):
        with Locations((-61.35, -30.148697086)):
            Rectangle(SKETCH13_W, SKETCH13_H)
    extrude(amount=-CUT_EXTRUDE3_DEPTH, mode=Mode.SUBTRACT)

    # Sketch34 → Cut-Extrude6 (cut)
    with BuildSketch(Plane.YZ.offset(-63.564713958)):
        with Locations((-79.980636632, -31.987266617)):
            Rectangle(SKETCH34_W, SKETCH34_H)
    extrude(amount=-CUT_EXTRUDE6_DEPTH, mode=Mode.SUBTRACT)


solid = part_1.part
